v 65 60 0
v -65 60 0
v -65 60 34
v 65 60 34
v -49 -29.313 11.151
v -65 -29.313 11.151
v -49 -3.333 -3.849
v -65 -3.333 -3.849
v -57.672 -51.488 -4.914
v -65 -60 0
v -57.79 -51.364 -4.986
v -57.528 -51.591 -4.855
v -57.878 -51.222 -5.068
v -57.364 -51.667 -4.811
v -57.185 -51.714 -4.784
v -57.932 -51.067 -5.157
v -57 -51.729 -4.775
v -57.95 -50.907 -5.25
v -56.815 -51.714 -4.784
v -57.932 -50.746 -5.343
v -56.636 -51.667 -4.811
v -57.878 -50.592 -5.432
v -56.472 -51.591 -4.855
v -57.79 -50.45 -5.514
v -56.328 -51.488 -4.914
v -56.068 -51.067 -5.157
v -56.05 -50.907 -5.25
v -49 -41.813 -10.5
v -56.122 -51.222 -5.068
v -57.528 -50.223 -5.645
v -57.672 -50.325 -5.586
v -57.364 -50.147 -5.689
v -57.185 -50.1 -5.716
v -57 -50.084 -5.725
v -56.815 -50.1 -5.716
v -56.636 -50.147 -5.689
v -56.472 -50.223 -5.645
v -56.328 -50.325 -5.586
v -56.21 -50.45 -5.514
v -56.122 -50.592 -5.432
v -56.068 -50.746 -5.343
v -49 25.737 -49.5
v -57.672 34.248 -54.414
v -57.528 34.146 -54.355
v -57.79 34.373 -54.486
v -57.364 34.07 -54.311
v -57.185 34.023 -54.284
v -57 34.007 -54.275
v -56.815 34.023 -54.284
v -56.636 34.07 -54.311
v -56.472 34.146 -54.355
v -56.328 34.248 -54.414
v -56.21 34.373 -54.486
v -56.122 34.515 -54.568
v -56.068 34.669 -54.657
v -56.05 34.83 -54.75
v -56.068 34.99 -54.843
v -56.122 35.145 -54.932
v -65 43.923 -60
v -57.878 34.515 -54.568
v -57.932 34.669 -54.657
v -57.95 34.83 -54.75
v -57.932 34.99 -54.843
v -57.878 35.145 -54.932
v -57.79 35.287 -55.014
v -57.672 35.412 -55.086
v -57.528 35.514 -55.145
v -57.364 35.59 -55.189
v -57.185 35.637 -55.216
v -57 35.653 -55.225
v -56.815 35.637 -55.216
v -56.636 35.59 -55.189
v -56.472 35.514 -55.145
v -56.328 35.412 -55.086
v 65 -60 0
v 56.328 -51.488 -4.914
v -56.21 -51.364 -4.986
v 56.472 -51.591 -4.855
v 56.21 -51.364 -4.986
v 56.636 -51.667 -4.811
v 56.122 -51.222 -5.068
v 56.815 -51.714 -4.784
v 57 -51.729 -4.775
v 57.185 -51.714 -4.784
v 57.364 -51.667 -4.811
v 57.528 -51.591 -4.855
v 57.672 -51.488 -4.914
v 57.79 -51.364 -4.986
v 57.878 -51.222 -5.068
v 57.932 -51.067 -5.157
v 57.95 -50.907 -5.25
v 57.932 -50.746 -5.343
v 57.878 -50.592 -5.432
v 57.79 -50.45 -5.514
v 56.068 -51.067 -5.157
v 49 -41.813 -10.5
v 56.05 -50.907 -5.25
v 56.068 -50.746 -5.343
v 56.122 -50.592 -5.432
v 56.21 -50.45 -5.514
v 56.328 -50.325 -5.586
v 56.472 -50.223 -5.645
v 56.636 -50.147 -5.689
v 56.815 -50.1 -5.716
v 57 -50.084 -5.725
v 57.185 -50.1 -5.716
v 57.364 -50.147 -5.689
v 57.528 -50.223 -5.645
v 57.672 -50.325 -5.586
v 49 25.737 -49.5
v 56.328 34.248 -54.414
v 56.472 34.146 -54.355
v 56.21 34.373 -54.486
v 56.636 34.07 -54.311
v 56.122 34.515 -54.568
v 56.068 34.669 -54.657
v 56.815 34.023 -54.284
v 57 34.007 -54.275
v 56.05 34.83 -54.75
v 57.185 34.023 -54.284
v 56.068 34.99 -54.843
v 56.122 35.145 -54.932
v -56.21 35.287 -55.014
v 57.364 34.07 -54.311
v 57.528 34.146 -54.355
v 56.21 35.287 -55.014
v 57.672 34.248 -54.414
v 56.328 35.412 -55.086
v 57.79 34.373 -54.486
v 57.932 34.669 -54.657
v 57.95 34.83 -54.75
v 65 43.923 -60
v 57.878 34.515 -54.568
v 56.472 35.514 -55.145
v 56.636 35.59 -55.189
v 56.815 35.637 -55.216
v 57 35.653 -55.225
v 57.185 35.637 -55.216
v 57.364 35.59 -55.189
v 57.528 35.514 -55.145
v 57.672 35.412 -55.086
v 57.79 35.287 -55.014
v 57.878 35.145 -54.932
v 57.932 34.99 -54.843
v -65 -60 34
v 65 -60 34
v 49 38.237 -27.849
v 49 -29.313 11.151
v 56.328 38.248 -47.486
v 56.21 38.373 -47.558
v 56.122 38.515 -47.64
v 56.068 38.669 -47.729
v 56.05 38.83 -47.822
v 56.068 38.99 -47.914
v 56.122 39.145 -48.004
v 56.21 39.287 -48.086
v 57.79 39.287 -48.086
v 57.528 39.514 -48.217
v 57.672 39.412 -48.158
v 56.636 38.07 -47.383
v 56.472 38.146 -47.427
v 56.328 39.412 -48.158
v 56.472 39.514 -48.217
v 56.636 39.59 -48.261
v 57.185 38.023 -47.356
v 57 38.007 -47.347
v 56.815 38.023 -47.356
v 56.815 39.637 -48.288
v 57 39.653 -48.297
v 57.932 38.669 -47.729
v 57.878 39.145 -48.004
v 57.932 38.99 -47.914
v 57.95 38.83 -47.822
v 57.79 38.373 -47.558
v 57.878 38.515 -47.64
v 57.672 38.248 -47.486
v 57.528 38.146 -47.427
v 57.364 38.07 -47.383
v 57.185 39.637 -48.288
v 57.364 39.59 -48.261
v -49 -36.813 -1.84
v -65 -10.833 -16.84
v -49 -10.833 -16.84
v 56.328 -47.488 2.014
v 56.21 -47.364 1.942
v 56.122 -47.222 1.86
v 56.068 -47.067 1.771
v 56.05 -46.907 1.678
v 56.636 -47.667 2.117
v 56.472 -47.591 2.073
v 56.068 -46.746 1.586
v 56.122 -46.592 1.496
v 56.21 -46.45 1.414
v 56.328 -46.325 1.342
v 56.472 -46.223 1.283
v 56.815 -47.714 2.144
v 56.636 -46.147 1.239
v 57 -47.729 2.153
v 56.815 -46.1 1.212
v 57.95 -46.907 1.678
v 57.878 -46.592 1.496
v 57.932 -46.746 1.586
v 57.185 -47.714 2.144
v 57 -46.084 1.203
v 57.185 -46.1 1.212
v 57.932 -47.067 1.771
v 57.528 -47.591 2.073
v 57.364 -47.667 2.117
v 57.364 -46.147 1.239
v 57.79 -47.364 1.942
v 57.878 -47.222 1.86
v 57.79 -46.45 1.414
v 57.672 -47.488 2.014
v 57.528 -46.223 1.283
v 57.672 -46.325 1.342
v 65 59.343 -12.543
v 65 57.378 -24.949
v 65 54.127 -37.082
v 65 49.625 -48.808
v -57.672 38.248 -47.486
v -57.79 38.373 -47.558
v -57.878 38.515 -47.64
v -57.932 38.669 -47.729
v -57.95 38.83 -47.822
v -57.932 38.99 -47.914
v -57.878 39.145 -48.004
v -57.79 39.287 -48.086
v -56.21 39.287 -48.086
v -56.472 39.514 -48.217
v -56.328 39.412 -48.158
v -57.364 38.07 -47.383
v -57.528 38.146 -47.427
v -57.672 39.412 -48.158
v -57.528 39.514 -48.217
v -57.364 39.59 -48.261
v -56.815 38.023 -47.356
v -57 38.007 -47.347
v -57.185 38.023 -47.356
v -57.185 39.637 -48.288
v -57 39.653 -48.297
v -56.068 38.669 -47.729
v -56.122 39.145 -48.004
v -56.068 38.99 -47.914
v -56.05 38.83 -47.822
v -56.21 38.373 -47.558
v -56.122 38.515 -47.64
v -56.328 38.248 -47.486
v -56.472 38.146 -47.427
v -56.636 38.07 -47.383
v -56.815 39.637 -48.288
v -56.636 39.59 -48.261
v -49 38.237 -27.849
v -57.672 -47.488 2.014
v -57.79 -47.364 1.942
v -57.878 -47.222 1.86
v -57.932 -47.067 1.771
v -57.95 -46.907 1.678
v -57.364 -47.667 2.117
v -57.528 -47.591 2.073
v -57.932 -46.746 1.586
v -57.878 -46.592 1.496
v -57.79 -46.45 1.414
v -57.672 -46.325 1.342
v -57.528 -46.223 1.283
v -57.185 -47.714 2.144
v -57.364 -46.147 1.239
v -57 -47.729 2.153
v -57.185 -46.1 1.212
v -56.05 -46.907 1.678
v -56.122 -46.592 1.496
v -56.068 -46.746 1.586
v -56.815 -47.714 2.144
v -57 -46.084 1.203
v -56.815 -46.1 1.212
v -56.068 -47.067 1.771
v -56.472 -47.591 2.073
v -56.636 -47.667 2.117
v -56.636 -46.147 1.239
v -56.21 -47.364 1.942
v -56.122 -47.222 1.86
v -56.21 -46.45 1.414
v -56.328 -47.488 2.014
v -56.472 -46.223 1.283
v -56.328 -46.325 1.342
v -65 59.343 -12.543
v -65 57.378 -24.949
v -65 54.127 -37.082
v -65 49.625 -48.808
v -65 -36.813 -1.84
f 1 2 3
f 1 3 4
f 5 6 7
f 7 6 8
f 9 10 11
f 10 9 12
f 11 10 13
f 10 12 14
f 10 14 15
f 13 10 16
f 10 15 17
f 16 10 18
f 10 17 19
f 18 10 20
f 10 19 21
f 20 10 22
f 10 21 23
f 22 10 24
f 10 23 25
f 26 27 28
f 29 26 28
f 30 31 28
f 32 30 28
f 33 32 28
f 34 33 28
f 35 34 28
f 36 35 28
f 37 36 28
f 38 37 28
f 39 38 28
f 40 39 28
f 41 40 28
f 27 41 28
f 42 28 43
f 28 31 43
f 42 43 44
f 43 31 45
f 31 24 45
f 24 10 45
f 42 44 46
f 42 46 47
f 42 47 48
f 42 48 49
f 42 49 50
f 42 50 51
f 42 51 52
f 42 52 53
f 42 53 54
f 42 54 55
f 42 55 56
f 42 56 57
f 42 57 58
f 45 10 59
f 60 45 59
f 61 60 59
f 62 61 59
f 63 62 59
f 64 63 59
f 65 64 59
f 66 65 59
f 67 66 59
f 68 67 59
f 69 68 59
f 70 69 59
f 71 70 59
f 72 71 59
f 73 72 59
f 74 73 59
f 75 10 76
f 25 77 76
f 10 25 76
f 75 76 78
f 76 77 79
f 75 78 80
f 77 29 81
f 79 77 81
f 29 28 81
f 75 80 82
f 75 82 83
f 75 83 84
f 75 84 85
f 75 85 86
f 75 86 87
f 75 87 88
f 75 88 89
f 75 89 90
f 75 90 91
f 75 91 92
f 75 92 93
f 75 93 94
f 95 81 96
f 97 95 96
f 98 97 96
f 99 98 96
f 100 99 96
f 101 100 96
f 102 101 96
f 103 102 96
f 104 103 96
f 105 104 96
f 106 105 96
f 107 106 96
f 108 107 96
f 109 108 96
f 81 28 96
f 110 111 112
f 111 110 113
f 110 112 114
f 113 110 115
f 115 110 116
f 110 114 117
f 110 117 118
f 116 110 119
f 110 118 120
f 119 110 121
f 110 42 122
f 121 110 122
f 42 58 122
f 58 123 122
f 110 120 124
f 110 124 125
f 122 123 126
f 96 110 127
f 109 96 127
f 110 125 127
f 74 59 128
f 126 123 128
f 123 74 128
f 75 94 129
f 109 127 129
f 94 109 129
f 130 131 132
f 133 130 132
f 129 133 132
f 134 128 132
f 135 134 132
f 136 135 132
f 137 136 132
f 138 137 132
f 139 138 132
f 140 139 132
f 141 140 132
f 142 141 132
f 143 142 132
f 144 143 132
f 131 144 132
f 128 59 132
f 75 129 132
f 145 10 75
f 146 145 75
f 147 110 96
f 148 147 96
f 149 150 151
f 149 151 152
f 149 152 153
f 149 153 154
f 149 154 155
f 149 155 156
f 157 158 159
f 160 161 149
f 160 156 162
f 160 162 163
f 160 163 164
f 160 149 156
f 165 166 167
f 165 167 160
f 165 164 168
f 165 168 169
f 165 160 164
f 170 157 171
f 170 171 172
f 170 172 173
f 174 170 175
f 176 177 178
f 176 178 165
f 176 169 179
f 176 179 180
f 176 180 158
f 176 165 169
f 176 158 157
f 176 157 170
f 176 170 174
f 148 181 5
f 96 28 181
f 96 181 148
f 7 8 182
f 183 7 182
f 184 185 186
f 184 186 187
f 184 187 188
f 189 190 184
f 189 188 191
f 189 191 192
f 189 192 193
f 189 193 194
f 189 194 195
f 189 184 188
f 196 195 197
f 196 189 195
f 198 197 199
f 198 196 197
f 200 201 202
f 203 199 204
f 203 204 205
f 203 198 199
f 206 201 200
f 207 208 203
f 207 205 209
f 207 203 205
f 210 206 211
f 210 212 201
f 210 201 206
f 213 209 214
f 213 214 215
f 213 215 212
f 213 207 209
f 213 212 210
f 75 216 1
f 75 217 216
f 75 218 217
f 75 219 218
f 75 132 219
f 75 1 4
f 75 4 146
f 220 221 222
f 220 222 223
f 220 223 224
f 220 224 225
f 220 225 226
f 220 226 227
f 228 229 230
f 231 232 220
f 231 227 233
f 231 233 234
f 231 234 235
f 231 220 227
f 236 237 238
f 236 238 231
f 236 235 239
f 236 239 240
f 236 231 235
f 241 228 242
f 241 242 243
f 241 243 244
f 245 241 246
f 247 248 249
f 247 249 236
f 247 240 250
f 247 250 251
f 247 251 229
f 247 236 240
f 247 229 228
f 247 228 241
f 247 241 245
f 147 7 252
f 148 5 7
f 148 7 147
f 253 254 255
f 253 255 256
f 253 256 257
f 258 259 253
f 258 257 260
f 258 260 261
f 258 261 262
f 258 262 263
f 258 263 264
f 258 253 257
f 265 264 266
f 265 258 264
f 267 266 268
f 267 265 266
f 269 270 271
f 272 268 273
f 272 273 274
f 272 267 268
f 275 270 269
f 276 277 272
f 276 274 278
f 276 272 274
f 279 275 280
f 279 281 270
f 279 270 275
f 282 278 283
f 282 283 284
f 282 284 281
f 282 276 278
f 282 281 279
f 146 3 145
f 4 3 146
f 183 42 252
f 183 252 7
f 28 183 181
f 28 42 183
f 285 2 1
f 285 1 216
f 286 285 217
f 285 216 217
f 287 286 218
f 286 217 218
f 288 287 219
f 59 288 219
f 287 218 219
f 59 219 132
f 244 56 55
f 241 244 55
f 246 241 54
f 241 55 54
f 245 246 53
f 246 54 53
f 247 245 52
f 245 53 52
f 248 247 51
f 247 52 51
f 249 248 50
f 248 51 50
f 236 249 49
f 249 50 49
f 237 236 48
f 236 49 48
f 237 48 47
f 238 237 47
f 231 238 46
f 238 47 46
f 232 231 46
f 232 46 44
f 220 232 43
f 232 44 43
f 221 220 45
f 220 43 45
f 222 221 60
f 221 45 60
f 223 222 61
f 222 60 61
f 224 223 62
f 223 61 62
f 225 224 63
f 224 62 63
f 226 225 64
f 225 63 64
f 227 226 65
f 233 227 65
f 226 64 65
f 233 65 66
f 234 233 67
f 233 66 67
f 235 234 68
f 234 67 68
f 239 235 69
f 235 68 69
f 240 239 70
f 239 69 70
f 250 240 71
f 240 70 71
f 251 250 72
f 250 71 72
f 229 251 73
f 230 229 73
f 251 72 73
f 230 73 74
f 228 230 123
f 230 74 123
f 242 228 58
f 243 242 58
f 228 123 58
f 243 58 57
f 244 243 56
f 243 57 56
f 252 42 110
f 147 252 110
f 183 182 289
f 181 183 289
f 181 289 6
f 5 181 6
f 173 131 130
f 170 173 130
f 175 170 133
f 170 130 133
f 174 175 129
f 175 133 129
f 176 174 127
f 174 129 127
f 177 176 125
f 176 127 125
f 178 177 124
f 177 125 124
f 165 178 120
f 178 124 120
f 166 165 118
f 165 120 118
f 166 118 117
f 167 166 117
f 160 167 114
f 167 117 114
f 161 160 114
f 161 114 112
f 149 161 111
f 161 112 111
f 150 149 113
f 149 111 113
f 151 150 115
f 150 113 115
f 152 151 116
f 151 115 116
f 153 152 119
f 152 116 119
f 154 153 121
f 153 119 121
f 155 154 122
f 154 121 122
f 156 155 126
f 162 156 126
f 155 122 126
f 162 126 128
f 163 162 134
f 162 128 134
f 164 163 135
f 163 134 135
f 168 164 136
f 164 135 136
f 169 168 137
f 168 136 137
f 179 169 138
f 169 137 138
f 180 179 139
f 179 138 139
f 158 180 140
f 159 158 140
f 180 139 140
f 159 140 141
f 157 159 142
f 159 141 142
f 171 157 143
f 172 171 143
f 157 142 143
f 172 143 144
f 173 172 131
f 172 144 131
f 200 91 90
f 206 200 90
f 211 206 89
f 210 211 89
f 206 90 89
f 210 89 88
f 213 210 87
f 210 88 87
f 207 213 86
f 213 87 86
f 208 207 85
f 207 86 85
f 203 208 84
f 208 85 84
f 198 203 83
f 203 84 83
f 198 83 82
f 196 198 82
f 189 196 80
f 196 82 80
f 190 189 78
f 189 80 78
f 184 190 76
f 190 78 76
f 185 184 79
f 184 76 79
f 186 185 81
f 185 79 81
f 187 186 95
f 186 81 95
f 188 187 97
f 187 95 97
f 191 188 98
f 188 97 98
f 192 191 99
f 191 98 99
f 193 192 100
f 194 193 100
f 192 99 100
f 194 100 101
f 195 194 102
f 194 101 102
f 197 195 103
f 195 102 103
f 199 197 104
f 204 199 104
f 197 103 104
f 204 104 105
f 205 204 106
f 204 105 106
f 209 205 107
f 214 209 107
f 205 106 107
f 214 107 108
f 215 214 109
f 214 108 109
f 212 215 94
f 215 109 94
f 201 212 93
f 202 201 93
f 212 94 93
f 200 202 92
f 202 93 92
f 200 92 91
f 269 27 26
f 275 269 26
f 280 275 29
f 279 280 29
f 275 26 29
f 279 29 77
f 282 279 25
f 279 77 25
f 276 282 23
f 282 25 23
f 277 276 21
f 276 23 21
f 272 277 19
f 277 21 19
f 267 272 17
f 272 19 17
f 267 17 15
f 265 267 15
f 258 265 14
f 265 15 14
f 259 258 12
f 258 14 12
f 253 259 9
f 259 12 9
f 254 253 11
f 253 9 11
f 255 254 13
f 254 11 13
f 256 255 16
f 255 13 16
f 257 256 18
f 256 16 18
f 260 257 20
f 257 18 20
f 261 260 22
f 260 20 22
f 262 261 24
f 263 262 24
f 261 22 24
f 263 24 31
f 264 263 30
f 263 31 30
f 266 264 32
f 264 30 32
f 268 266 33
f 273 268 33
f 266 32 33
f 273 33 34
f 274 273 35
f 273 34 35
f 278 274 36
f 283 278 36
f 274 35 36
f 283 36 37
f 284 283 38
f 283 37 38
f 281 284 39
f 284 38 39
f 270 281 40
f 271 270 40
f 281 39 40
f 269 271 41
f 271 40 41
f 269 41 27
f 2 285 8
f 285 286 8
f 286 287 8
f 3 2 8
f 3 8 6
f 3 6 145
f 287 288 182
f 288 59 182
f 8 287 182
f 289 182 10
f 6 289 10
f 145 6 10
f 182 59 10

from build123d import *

# Parameters (mm, degrees)
F0_W     = 130
F0_H     = 120
F1_DEPTH = 34
F2_ANGLE = 30
F3_W     = 98
F3_H     = 78
F4_DEPTH = 25
F6_DEPTH = 16
F7_R     = 0.95
F8_DEPTH = 8


with BuildPart() as f1:
    # F0 (on Top) → F1 (new body)
    with BuildSketch(Plane.XY):
        Rectangle(F0_W, F0_H)
    extrude(amount=F1_DEPTH)

    # F0 (on Top) → F2 (revolve)
    with BuildSketch(Plane.XY):
        Rectangle(F0_W, F0_H)
    revolve(axis=Axis((0, -60, 0), (-1, 0, 0)), revolution_arc=F2_ANGLE)

    # F3 (on face) → F4 (cut)
    with BuildSketch(Plane(origin=(0, -15, -25.9807621135), x_dir=(1, 0, 0), z_dir=(0, -0.5, -0.8660254038))):
        with Locations((0, -8.0384757729)):
            Rectangle(F3_W, F3_H)
    extrude(amount=-F4_DEPTH, mode=Mode.SUBTRACT)

    # F5 (on face) → F6 (cut)
    with BuildSketch(Plane(origin=(-65, 0, 0), x_dir=(0, -1, 0), z_dir=(-1, 0, 0))):
        Polygon((10.832704407, -16.8397459622), (36.8134665205, -1.8397459622), (29.3134665205, 11.1506350946), (3.332704407, -3.8493649054), align=None)
    extrude(amount=-F6_DEPTH, mode=Mode.SUBTRACT)

    # F7 (on face) → F8 (cut)
    with BuildSketch(Plane(origin=(0, -15, -25.9807621135), x_dir=(1, 0, 0), z_dir=(0, -0.5, -0.8660254038))):
        with Locations((57, 41.4615242271)):
            Circle(F7_R)
        with Locations((-57, 41.4615242271)):
            Circle(F7_R)
        with Locations((-57, -57.5384757729)):
            Circle(F7_R)
        with Locations((57, -57.5384757729)):
            Circle(F7_R)
    extrude(amount=-F8_DEPTH, mode=Mode.SUBTRACT)


solid = f1.part
